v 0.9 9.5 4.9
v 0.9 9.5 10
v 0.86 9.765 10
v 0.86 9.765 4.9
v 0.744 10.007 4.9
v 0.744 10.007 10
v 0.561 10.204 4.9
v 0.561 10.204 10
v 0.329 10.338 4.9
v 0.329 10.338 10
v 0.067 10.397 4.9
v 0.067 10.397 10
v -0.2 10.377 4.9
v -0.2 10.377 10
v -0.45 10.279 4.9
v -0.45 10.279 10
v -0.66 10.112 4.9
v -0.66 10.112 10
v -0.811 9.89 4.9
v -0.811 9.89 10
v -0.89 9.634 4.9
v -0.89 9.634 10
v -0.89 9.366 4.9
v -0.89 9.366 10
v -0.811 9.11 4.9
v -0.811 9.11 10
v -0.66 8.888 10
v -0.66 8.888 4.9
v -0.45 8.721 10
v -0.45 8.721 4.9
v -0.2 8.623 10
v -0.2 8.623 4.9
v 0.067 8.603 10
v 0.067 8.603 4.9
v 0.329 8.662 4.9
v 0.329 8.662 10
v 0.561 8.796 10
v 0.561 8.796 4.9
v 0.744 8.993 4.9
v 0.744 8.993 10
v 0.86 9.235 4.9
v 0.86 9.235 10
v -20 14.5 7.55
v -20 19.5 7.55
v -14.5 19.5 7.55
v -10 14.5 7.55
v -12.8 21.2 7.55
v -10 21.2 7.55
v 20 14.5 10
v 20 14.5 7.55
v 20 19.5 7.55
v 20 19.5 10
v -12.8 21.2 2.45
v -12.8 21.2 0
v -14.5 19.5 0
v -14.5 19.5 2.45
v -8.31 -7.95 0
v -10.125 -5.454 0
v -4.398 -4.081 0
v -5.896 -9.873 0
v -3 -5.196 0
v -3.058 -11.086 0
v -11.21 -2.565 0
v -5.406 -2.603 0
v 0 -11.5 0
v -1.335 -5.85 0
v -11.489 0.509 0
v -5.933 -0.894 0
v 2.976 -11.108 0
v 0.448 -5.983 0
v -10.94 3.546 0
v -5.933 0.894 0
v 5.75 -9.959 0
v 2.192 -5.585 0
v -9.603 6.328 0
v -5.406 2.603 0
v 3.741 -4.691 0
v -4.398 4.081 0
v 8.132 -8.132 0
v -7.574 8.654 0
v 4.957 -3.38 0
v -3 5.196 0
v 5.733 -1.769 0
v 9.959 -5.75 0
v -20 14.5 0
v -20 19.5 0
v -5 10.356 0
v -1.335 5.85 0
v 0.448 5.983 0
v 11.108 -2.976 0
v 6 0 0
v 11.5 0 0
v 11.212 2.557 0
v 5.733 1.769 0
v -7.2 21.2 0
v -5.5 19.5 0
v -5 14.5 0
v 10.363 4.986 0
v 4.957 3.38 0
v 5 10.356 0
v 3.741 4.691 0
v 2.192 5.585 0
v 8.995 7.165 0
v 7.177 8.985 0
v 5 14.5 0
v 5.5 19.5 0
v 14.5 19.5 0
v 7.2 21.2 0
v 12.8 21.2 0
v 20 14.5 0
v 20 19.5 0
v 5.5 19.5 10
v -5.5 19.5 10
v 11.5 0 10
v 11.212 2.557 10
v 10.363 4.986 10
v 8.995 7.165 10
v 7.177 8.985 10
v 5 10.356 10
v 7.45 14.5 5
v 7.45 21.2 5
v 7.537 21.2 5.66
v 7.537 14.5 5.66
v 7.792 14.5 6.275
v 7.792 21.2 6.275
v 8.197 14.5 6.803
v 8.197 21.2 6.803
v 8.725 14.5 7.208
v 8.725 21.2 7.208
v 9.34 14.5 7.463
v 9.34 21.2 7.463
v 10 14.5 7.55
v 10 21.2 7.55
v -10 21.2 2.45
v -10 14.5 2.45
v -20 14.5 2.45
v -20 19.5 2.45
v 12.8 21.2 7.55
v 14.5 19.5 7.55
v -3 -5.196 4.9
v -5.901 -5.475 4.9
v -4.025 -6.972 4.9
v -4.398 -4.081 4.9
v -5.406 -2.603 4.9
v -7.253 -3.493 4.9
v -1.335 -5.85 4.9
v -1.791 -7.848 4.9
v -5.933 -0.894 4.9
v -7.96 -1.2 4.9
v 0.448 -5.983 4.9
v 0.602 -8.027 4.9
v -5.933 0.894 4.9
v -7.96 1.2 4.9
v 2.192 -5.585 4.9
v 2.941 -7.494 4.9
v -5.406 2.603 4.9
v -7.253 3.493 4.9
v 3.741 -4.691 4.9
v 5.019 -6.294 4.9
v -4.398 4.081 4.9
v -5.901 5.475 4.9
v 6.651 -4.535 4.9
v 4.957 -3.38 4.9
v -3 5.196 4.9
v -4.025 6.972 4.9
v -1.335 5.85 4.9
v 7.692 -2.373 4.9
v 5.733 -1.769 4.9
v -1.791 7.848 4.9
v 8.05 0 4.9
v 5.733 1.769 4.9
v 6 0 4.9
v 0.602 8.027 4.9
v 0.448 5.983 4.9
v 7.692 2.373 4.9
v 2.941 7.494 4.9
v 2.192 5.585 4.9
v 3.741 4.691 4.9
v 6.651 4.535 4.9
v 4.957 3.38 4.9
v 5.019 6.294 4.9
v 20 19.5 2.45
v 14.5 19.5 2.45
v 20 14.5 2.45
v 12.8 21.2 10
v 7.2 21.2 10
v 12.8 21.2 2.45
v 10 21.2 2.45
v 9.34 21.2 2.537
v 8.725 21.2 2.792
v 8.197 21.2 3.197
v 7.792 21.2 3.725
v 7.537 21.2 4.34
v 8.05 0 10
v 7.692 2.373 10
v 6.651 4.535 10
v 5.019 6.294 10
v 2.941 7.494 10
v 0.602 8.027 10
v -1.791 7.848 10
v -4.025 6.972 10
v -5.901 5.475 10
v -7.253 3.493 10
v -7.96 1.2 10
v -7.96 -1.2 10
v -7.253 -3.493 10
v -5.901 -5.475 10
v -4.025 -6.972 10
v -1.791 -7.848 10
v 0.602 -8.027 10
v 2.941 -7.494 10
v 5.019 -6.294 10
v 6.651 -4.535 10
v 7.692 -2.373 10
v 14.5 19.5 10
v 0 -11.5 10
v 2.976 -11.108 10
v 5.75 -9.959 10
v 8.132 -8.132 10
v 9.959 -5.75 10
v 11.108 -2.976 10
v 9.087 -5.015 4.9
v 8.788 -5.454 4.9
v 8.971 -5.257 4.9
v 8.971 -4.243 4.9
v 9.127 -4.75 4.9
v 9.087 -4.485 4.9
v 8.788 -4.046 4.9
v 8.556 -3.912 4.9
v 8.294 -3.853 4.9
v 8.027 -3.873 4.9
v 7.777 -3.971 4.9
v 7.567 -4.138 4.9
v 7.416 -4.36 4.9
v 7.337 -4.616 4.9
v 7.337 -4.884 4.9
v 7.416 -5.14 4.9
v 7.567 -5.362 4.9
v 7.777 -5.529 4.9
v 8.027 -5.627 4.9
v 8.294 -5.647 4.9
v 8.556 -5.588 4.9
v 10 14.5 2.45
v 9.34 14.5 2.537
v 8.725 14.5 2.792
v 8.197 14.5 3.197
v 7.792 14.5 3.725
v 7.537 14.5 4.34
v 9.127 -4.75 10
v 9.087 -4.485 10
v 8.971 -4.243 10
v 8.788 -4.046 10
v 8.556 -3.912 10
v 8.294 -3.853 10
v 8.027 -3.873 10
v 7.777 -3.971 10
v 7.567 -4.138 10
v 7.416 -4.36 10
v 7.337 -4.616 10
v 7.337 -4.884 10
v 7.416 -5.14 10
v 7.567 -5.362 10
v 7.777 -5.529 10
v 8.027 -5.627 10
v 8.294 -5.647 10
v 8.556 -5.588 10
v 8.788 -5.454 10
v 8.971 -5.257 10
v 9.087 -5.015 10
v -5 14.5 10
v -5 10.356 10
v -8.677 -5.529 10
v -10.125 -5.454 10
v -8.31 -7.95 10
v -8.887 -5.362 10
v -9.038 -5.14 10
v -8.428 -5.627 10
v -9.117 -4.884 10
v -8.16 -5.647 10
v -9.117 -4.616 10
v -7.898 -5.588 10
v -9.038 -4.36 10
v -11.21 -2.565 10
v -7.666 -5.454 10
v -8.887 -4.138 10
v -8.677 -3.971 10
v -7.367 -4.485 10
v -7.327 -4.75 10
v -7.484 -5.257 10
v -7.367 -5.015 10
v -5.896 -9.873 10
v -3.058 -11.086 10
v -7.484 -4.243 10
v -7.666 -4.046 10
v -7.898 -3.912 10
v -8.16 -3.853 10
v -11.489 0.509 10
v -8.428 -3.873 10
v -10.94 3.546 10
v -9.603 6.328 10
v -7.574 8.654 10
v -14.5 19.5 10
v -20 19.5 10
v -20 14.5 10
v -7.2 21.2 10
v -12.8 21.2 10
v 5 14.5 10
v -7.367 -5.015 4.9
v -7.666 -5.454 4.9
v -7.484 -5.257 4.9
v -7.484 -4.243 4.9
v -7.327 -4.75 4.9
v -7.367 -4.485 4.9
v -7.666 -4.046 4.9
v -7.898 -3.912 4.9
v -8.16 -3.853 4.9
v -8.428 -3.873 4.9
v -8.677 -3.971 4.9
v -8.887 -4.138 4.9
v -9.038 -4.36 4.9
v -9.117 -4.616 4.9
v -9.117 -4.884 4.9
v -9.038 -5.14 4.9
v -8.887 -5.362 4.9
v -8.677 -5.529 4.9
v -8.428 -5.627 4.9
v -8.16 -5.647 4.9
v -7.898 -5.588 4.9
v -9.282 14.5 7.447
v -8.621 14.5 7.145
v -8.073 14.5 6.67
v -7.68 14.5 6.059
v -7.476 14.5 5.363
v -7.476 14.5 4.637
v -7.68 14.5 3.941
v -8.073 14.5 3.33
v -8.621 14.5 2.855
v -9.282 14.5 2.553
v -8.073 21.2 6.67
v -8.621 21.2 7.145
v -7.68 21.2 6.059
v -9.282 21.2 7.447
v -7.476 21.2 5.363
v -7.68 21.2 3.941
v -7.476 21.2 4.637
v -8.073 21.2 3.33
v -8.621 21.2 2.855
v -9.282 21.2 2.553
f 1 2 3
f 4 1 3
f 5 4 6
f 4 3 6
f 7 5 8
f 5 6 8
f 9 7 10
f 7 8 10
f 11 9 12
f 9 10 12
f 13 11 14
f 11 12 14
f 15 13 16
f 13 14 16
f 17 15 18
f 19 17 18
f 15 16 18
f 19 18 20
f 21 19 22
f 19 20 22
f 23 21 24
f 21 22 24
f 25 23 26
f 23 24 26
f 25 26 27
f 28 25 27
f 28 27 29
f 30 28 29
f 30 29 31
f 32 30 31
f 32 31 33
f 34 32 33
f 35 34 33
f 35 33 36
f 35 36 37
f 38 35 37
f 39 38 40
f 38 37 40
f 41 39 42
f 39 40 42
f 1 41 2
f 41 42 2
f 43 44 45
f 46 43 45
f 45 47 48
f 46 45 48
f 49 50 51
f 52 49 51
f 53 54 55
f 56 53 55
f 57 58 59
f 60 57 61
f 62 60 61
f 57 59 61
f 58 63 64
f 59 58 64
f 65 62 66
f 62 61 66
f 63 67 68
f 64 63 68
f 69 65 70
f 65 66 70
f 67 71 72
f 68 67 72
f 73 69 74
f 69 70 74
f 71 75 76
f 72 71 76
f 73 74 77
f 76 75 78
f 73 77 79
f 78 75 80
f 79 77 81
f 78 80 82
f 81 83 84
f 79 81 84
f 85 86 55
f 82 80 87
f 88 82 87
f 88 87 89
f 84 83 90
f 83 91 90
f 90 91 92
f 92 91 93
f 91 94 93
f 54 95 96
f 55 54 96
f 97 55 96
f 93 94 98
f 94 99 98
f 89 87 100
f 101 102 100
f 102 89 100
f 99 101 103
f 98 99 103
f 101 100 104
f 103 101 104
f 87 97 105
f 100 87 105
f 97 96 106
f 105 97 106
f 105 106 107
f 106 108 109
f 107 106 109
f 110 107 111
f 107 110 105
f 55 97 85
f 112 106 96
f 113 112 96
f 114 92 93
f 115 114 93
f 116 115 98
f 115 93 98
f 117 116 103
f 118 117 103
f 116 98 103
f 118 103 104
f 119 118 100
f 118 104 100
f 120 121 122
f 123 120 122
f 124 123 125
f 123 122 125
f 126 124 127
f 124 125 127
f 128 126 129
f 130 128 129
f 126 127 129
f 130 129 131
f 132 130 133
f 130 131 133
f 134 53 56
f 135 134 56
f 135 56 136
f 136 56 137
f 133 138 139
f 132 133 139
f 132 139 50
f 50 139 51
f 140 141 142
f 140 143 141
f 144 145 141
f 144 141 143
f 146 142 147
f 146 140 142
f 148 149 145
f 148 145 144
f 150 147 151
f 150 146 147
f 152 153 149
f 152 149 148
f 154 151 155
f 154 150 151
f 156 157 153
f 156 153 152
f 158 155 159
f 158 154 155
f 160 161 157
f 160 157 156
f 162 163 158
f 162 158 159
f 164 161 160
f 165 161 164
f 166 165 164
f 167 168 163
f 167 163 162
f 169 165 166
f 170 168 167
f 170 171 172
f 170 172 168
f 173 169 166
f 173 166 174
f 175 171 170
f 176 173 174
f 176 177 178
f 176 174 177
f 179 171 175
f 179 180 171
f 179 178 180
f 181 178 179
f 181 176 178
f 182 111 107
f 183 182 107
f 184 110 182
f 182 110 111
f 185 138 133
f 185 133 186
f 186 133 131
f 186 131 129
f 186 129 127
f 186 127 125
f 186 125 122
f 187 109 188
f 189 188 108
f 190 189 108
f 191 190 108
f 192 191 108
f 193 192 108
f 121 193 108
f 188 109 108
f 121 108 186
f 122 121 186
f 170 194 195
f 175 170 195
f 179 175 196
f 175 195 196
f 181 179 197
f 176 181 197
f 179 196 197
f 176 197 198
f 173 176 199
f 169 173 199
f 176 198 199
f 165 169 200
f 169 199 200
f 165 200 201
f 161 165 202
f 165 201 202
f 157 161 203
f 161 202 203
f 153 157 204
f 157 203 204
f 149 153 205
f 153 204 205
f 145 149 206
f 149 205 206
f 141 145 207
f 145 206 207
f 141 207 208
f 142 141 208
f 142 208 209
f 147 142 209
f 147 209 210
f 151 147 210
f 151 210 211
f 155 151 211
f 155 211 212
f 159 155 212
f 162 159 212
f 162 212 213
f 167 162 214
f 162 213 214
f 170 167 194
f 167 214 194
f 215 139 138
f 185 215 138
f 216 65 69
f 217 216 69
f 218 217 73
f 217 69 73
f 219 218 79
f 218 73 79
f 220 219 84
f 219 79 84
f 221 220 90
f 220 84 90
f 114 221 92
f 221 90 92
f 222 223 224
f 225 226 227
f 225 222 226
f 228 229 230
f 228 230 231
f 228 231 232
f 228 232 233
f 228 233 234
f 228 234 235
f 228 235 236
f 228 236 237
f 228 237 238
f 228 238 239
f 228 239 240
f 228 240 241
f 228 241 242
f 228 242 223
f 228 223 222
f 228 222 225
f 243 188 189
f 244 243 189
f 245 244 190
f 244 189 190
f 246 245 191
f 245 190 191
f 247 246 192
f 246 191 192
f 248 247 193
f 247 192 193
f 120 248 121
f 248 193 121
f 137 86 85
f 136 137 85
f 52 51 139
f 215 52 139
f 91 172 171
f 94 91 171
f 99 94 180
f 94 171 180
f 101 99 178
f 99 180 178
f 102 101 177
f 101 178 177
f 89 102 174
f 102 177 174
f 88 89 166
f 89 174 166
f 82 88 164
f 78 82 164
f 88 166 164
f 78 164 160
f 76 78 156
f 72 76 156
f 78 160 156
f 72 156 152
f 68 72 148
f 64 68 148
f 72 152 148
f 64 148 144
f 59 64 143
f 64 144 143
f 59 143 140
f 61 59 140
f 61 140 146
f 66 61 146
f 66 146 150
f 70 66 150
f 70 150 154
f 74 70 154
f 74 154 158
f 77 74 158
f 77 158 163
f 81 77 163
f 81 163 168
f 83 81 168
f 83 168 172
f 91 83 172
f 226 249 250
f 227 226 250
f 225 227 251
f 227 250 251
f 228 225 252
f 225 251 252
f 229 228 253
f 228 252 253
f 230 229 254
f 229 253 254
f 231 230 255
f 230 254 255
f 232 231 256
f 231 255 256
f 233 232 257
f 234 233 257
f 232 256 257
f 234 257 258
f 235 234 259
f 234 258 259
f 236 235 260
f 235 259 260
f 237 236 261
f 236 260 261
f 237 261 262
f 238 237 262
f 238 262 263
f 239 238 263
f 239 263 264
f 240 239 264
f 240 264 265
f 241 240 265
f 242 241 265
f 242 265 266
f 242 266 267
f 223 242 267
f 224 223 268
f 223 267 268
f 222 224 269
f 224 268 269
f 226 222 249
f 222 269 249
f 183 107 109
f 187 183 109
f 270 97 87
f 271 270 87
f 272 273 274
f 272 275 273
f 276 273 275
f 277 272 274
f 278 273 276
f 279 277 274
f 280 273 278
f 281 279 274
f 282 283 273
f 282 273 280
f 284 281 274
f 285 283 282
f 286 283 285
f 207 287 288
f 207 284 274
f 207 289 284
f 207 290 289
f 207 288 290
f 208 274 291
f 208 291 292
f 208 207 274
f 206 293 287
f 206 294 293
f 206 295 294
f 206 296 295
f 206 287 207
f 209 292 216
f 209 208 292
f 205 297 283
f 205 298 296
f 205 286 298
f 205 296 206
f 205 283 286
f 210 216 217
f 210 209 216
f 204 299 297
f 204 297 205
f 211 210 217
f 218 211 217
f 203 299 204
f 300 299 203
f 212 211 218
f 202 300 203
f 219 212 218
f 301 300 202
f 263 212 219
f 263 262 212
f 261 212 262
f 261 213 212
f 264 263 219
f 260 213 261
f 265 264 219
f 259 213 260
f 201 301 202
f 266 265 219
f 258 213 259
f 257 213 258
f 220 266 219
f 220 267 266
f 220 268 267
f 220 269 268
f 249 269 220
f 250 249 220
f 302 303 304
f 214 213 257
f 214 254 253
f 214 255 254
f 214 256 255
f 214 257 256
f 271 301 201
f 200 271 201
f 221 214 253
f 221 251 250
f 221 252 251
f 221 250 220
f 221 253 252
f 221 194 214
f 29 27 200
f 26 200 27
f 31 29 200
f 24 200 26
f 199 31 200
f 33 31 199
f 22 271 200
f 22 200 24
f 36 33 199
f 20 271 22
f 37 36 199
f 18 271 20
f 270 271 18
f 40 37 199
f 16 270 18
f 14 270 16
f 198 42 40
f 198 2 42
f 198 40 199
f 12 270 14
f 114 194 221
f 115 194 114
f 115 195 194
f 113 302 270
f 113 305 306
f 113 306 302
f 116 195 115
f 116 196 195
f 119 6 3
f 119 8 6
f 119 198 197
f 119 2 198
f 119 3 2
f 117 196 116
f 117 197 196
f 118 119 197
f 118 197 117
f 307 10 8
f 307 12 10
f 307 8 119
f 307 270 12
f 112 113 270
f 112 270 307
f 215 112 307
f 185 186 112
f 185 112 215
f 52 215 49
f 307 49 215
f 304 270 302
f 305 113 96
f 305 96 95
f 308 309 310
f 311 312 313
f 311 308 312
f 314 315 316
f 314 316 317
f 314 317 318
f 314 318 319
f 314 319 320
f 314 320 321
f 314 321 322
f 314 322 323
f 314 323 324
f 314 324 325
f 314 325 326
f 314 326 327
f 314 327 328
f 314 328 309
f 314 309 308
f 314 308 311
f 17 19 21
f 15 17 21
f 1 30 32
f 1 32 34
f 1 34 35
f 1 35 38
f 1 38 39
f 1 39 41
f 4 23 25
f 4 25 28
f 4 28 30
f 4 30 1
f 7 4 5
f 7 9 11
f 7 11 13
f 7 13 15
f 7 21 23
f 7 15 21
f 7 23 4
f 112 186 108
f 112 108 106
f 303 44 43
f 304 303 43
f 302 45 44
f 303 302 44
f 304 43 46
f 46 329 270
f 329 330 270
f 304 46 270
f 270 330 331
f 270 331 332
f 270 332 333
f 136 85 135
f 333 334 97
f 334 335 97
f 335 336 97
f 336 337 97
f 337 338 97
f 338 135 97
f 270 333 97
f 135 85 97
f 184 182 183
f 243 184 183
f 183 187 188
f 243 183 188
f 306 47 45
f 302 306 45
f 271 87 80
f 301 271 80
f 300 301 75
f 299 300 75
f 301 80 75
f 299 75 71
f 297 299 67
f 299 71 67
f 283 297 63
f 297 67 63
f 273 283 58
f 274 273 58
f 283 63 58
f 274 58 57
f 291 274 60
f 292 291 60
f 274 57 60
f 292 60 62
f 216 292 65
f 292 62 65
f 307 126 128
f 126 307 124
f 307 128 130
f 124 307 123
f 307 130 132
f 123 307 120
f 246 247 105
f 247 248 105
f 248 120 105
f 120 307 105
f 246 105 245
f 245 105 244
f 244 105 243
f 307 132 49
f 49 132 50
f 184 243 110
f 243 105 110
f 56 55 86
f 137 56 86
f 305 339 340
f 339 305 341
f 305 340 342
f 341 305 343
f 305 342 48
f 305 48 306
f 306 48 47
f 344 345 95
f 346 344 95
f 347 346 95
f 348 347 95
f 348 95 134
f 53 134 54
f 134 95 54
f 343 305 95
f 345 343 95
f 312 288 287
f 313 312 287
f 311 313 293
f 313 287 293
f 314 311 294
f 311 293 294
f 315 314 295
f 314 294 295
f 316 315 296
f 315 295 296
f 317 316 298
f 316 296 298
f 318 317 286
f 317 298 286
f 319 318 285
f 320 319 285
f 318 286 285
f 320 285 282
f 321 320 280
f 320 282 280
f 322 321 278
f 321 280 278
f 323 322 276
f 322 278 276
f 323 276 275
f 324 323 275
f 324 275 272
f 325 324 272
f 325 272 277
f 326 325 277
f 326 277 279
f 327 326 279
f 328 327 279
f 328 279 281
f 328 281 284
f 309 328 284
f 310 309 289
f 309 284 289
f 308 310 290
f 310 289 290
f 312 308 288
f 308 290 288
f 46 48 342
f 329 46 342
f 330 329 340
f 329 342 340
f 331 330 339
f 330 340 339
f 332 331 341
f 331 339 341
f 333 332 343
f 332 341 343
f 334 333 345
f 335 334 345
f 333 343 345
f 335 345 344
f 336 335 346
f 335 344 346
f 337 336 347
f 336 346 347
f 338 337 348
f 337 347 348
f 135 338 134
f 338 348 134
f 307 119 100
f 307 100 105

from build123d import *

# Parameters (mm, degrees)
F1_DEPTH = 10
F2_R     = 6
F3_DEPTH = 10
F2_R_2   = 8.05
F2_R_3   = 0.9
F4_DEPTH = 5.1
F7_DEPTH = 6.7


with BuildPart() as f1:
    # F0 (on Top) → F1 (new body)
    with BuildSketch(Plane.XY):
        with BuildLine():
            Line((-5, 14.5), (-5, 10.3561575886))
            ThreePointArc((-5, 10.3561575886), (0, 11.5), (5, 10.3561575886))
            Line((5, 10.3561575886), (5, 14.5))
            Line((5, 14.5), (20, 14.5))
            Line((20, 14.5), (20, 19.5))
            Line((20, 19.5), (14.5, 19.5))
            Line((14.5, 19.5), (12.8, 21.2))
            Line((12.8, 21.2), (7.2, 21.2))
            Line((7.2, 21.2), (5.5, 19.5))
            Line((5.5, 19.5), (-5.5, 19.5))
            Line((-5.5, 19.5), (-7.2, 21.2))
            Line((-7.2, 21.2), (-12.8, 21.2))
            Line((-12.8, 21.2), (-14.5, 19.5))
            Line((-14.5, 19.5), (-20, 19.5))
            Line((-20, 19.5), (-20, 14.5))
            Line((-20, 14.5), (-5, 14.5))
        make_face()
        with BuildLine():
            ThreePointArc((-5, 10.3561575886), (-11.2103927672, -2.5645845676), (5.56e-08, -11.5))
            ThreePointArc((5.56e-08, -11.5), (8.1317280033, -8.131727964), (11.5, 0))
            ThreePointArc((11.5, 0), (9.7403798694, 6.1135096303), (5, 10.3561575886))
            ThreePointArc((5, 10.3561575886), (0, 11.5), (-5, 10.3561575886))
        make_face()
    extrude(amount=F1_DEPTH)

    # F2 (on face) → F3 (cut, through all)
    with BuildSketch(Plane.XY.offset(10)):
        Circle(F2_R)
    extrude(amount=-F3_DEPTH, mode=Mode.SUBTRACT)

    # F2 (on face) → F4 (cut)
    with BuildSketch(Plane.XY.offset(10)):
        Circle(F2_R_2)
        Circle(F2_R, mode=Mode.SUBTRACT)
        with Locations((-8.227241336, -4.75)):
            Circle(F2_R_3)
        with Locations((0, 9.5)):
            Circle(F2_R_3)
        with Locations((8.227241336, -4.75)):
            Circle(F2_R_3)
    extrude(amount=-F4_DEPTH, mode=Mode.SUBTRACT)

    # F6 (on offset) → F7 (cut, through all)
    with BuildSketch(Plane(origin=(0, 21.2, 0), x_dir=(-1, 0, 0), z_dir=(0, 1, 0))):
        with BuildLine():
            ThreePointArc((10, 2.45), (11.803122292, 3.196877708), (12.55, 5))
            ThreePointArc((12.55, 5), (11.803122292, 6.803122292), (10, 7.55))
            ThreePointArc((10, 7.55), (7.45, 5), (10, 2.45))
        make_face()
        with BuildLine():
            ThreePointArc((10, 7.55), (11.803122292, 6.803122292), (12.55, 5))
            ThreePointArc((12.55, 5), (11.803122292, 3.196877708), (10, 2.45))
            Line((10, 2.45), (20, 2.45))
            Line((20, 2.45), (20, 7.55))
            Line((20, 7.55), (10, 7.55))
        make_face()
        with BuildLine():
            ThreePointArc((-10, 2.45), (-12.55, 5), (-10, 7.55))
            Line((-10, 7.55), (-20, 7.55))
            Line((-20, 7.55), (-20, 2.45))
            Line((-20, 2.45), (-10, 2.45))
        make_face()
        with BuildLine():
            ThreePointArc((-10, 2.45), (-8.196877708, 3.196877708), (-7.45, 5))
            ThreePointArc((-7.45, 5), (-8.196877708, 6.803122292), (-10, 7.55))
            ThreePointArc((-10, 7.55), (-12.55, 5), (-10, 2.45))
        make_face()
    extrude(amount=-F7_DEPTH, mode=Mode.SUBTRACT)


solid = f1.part
